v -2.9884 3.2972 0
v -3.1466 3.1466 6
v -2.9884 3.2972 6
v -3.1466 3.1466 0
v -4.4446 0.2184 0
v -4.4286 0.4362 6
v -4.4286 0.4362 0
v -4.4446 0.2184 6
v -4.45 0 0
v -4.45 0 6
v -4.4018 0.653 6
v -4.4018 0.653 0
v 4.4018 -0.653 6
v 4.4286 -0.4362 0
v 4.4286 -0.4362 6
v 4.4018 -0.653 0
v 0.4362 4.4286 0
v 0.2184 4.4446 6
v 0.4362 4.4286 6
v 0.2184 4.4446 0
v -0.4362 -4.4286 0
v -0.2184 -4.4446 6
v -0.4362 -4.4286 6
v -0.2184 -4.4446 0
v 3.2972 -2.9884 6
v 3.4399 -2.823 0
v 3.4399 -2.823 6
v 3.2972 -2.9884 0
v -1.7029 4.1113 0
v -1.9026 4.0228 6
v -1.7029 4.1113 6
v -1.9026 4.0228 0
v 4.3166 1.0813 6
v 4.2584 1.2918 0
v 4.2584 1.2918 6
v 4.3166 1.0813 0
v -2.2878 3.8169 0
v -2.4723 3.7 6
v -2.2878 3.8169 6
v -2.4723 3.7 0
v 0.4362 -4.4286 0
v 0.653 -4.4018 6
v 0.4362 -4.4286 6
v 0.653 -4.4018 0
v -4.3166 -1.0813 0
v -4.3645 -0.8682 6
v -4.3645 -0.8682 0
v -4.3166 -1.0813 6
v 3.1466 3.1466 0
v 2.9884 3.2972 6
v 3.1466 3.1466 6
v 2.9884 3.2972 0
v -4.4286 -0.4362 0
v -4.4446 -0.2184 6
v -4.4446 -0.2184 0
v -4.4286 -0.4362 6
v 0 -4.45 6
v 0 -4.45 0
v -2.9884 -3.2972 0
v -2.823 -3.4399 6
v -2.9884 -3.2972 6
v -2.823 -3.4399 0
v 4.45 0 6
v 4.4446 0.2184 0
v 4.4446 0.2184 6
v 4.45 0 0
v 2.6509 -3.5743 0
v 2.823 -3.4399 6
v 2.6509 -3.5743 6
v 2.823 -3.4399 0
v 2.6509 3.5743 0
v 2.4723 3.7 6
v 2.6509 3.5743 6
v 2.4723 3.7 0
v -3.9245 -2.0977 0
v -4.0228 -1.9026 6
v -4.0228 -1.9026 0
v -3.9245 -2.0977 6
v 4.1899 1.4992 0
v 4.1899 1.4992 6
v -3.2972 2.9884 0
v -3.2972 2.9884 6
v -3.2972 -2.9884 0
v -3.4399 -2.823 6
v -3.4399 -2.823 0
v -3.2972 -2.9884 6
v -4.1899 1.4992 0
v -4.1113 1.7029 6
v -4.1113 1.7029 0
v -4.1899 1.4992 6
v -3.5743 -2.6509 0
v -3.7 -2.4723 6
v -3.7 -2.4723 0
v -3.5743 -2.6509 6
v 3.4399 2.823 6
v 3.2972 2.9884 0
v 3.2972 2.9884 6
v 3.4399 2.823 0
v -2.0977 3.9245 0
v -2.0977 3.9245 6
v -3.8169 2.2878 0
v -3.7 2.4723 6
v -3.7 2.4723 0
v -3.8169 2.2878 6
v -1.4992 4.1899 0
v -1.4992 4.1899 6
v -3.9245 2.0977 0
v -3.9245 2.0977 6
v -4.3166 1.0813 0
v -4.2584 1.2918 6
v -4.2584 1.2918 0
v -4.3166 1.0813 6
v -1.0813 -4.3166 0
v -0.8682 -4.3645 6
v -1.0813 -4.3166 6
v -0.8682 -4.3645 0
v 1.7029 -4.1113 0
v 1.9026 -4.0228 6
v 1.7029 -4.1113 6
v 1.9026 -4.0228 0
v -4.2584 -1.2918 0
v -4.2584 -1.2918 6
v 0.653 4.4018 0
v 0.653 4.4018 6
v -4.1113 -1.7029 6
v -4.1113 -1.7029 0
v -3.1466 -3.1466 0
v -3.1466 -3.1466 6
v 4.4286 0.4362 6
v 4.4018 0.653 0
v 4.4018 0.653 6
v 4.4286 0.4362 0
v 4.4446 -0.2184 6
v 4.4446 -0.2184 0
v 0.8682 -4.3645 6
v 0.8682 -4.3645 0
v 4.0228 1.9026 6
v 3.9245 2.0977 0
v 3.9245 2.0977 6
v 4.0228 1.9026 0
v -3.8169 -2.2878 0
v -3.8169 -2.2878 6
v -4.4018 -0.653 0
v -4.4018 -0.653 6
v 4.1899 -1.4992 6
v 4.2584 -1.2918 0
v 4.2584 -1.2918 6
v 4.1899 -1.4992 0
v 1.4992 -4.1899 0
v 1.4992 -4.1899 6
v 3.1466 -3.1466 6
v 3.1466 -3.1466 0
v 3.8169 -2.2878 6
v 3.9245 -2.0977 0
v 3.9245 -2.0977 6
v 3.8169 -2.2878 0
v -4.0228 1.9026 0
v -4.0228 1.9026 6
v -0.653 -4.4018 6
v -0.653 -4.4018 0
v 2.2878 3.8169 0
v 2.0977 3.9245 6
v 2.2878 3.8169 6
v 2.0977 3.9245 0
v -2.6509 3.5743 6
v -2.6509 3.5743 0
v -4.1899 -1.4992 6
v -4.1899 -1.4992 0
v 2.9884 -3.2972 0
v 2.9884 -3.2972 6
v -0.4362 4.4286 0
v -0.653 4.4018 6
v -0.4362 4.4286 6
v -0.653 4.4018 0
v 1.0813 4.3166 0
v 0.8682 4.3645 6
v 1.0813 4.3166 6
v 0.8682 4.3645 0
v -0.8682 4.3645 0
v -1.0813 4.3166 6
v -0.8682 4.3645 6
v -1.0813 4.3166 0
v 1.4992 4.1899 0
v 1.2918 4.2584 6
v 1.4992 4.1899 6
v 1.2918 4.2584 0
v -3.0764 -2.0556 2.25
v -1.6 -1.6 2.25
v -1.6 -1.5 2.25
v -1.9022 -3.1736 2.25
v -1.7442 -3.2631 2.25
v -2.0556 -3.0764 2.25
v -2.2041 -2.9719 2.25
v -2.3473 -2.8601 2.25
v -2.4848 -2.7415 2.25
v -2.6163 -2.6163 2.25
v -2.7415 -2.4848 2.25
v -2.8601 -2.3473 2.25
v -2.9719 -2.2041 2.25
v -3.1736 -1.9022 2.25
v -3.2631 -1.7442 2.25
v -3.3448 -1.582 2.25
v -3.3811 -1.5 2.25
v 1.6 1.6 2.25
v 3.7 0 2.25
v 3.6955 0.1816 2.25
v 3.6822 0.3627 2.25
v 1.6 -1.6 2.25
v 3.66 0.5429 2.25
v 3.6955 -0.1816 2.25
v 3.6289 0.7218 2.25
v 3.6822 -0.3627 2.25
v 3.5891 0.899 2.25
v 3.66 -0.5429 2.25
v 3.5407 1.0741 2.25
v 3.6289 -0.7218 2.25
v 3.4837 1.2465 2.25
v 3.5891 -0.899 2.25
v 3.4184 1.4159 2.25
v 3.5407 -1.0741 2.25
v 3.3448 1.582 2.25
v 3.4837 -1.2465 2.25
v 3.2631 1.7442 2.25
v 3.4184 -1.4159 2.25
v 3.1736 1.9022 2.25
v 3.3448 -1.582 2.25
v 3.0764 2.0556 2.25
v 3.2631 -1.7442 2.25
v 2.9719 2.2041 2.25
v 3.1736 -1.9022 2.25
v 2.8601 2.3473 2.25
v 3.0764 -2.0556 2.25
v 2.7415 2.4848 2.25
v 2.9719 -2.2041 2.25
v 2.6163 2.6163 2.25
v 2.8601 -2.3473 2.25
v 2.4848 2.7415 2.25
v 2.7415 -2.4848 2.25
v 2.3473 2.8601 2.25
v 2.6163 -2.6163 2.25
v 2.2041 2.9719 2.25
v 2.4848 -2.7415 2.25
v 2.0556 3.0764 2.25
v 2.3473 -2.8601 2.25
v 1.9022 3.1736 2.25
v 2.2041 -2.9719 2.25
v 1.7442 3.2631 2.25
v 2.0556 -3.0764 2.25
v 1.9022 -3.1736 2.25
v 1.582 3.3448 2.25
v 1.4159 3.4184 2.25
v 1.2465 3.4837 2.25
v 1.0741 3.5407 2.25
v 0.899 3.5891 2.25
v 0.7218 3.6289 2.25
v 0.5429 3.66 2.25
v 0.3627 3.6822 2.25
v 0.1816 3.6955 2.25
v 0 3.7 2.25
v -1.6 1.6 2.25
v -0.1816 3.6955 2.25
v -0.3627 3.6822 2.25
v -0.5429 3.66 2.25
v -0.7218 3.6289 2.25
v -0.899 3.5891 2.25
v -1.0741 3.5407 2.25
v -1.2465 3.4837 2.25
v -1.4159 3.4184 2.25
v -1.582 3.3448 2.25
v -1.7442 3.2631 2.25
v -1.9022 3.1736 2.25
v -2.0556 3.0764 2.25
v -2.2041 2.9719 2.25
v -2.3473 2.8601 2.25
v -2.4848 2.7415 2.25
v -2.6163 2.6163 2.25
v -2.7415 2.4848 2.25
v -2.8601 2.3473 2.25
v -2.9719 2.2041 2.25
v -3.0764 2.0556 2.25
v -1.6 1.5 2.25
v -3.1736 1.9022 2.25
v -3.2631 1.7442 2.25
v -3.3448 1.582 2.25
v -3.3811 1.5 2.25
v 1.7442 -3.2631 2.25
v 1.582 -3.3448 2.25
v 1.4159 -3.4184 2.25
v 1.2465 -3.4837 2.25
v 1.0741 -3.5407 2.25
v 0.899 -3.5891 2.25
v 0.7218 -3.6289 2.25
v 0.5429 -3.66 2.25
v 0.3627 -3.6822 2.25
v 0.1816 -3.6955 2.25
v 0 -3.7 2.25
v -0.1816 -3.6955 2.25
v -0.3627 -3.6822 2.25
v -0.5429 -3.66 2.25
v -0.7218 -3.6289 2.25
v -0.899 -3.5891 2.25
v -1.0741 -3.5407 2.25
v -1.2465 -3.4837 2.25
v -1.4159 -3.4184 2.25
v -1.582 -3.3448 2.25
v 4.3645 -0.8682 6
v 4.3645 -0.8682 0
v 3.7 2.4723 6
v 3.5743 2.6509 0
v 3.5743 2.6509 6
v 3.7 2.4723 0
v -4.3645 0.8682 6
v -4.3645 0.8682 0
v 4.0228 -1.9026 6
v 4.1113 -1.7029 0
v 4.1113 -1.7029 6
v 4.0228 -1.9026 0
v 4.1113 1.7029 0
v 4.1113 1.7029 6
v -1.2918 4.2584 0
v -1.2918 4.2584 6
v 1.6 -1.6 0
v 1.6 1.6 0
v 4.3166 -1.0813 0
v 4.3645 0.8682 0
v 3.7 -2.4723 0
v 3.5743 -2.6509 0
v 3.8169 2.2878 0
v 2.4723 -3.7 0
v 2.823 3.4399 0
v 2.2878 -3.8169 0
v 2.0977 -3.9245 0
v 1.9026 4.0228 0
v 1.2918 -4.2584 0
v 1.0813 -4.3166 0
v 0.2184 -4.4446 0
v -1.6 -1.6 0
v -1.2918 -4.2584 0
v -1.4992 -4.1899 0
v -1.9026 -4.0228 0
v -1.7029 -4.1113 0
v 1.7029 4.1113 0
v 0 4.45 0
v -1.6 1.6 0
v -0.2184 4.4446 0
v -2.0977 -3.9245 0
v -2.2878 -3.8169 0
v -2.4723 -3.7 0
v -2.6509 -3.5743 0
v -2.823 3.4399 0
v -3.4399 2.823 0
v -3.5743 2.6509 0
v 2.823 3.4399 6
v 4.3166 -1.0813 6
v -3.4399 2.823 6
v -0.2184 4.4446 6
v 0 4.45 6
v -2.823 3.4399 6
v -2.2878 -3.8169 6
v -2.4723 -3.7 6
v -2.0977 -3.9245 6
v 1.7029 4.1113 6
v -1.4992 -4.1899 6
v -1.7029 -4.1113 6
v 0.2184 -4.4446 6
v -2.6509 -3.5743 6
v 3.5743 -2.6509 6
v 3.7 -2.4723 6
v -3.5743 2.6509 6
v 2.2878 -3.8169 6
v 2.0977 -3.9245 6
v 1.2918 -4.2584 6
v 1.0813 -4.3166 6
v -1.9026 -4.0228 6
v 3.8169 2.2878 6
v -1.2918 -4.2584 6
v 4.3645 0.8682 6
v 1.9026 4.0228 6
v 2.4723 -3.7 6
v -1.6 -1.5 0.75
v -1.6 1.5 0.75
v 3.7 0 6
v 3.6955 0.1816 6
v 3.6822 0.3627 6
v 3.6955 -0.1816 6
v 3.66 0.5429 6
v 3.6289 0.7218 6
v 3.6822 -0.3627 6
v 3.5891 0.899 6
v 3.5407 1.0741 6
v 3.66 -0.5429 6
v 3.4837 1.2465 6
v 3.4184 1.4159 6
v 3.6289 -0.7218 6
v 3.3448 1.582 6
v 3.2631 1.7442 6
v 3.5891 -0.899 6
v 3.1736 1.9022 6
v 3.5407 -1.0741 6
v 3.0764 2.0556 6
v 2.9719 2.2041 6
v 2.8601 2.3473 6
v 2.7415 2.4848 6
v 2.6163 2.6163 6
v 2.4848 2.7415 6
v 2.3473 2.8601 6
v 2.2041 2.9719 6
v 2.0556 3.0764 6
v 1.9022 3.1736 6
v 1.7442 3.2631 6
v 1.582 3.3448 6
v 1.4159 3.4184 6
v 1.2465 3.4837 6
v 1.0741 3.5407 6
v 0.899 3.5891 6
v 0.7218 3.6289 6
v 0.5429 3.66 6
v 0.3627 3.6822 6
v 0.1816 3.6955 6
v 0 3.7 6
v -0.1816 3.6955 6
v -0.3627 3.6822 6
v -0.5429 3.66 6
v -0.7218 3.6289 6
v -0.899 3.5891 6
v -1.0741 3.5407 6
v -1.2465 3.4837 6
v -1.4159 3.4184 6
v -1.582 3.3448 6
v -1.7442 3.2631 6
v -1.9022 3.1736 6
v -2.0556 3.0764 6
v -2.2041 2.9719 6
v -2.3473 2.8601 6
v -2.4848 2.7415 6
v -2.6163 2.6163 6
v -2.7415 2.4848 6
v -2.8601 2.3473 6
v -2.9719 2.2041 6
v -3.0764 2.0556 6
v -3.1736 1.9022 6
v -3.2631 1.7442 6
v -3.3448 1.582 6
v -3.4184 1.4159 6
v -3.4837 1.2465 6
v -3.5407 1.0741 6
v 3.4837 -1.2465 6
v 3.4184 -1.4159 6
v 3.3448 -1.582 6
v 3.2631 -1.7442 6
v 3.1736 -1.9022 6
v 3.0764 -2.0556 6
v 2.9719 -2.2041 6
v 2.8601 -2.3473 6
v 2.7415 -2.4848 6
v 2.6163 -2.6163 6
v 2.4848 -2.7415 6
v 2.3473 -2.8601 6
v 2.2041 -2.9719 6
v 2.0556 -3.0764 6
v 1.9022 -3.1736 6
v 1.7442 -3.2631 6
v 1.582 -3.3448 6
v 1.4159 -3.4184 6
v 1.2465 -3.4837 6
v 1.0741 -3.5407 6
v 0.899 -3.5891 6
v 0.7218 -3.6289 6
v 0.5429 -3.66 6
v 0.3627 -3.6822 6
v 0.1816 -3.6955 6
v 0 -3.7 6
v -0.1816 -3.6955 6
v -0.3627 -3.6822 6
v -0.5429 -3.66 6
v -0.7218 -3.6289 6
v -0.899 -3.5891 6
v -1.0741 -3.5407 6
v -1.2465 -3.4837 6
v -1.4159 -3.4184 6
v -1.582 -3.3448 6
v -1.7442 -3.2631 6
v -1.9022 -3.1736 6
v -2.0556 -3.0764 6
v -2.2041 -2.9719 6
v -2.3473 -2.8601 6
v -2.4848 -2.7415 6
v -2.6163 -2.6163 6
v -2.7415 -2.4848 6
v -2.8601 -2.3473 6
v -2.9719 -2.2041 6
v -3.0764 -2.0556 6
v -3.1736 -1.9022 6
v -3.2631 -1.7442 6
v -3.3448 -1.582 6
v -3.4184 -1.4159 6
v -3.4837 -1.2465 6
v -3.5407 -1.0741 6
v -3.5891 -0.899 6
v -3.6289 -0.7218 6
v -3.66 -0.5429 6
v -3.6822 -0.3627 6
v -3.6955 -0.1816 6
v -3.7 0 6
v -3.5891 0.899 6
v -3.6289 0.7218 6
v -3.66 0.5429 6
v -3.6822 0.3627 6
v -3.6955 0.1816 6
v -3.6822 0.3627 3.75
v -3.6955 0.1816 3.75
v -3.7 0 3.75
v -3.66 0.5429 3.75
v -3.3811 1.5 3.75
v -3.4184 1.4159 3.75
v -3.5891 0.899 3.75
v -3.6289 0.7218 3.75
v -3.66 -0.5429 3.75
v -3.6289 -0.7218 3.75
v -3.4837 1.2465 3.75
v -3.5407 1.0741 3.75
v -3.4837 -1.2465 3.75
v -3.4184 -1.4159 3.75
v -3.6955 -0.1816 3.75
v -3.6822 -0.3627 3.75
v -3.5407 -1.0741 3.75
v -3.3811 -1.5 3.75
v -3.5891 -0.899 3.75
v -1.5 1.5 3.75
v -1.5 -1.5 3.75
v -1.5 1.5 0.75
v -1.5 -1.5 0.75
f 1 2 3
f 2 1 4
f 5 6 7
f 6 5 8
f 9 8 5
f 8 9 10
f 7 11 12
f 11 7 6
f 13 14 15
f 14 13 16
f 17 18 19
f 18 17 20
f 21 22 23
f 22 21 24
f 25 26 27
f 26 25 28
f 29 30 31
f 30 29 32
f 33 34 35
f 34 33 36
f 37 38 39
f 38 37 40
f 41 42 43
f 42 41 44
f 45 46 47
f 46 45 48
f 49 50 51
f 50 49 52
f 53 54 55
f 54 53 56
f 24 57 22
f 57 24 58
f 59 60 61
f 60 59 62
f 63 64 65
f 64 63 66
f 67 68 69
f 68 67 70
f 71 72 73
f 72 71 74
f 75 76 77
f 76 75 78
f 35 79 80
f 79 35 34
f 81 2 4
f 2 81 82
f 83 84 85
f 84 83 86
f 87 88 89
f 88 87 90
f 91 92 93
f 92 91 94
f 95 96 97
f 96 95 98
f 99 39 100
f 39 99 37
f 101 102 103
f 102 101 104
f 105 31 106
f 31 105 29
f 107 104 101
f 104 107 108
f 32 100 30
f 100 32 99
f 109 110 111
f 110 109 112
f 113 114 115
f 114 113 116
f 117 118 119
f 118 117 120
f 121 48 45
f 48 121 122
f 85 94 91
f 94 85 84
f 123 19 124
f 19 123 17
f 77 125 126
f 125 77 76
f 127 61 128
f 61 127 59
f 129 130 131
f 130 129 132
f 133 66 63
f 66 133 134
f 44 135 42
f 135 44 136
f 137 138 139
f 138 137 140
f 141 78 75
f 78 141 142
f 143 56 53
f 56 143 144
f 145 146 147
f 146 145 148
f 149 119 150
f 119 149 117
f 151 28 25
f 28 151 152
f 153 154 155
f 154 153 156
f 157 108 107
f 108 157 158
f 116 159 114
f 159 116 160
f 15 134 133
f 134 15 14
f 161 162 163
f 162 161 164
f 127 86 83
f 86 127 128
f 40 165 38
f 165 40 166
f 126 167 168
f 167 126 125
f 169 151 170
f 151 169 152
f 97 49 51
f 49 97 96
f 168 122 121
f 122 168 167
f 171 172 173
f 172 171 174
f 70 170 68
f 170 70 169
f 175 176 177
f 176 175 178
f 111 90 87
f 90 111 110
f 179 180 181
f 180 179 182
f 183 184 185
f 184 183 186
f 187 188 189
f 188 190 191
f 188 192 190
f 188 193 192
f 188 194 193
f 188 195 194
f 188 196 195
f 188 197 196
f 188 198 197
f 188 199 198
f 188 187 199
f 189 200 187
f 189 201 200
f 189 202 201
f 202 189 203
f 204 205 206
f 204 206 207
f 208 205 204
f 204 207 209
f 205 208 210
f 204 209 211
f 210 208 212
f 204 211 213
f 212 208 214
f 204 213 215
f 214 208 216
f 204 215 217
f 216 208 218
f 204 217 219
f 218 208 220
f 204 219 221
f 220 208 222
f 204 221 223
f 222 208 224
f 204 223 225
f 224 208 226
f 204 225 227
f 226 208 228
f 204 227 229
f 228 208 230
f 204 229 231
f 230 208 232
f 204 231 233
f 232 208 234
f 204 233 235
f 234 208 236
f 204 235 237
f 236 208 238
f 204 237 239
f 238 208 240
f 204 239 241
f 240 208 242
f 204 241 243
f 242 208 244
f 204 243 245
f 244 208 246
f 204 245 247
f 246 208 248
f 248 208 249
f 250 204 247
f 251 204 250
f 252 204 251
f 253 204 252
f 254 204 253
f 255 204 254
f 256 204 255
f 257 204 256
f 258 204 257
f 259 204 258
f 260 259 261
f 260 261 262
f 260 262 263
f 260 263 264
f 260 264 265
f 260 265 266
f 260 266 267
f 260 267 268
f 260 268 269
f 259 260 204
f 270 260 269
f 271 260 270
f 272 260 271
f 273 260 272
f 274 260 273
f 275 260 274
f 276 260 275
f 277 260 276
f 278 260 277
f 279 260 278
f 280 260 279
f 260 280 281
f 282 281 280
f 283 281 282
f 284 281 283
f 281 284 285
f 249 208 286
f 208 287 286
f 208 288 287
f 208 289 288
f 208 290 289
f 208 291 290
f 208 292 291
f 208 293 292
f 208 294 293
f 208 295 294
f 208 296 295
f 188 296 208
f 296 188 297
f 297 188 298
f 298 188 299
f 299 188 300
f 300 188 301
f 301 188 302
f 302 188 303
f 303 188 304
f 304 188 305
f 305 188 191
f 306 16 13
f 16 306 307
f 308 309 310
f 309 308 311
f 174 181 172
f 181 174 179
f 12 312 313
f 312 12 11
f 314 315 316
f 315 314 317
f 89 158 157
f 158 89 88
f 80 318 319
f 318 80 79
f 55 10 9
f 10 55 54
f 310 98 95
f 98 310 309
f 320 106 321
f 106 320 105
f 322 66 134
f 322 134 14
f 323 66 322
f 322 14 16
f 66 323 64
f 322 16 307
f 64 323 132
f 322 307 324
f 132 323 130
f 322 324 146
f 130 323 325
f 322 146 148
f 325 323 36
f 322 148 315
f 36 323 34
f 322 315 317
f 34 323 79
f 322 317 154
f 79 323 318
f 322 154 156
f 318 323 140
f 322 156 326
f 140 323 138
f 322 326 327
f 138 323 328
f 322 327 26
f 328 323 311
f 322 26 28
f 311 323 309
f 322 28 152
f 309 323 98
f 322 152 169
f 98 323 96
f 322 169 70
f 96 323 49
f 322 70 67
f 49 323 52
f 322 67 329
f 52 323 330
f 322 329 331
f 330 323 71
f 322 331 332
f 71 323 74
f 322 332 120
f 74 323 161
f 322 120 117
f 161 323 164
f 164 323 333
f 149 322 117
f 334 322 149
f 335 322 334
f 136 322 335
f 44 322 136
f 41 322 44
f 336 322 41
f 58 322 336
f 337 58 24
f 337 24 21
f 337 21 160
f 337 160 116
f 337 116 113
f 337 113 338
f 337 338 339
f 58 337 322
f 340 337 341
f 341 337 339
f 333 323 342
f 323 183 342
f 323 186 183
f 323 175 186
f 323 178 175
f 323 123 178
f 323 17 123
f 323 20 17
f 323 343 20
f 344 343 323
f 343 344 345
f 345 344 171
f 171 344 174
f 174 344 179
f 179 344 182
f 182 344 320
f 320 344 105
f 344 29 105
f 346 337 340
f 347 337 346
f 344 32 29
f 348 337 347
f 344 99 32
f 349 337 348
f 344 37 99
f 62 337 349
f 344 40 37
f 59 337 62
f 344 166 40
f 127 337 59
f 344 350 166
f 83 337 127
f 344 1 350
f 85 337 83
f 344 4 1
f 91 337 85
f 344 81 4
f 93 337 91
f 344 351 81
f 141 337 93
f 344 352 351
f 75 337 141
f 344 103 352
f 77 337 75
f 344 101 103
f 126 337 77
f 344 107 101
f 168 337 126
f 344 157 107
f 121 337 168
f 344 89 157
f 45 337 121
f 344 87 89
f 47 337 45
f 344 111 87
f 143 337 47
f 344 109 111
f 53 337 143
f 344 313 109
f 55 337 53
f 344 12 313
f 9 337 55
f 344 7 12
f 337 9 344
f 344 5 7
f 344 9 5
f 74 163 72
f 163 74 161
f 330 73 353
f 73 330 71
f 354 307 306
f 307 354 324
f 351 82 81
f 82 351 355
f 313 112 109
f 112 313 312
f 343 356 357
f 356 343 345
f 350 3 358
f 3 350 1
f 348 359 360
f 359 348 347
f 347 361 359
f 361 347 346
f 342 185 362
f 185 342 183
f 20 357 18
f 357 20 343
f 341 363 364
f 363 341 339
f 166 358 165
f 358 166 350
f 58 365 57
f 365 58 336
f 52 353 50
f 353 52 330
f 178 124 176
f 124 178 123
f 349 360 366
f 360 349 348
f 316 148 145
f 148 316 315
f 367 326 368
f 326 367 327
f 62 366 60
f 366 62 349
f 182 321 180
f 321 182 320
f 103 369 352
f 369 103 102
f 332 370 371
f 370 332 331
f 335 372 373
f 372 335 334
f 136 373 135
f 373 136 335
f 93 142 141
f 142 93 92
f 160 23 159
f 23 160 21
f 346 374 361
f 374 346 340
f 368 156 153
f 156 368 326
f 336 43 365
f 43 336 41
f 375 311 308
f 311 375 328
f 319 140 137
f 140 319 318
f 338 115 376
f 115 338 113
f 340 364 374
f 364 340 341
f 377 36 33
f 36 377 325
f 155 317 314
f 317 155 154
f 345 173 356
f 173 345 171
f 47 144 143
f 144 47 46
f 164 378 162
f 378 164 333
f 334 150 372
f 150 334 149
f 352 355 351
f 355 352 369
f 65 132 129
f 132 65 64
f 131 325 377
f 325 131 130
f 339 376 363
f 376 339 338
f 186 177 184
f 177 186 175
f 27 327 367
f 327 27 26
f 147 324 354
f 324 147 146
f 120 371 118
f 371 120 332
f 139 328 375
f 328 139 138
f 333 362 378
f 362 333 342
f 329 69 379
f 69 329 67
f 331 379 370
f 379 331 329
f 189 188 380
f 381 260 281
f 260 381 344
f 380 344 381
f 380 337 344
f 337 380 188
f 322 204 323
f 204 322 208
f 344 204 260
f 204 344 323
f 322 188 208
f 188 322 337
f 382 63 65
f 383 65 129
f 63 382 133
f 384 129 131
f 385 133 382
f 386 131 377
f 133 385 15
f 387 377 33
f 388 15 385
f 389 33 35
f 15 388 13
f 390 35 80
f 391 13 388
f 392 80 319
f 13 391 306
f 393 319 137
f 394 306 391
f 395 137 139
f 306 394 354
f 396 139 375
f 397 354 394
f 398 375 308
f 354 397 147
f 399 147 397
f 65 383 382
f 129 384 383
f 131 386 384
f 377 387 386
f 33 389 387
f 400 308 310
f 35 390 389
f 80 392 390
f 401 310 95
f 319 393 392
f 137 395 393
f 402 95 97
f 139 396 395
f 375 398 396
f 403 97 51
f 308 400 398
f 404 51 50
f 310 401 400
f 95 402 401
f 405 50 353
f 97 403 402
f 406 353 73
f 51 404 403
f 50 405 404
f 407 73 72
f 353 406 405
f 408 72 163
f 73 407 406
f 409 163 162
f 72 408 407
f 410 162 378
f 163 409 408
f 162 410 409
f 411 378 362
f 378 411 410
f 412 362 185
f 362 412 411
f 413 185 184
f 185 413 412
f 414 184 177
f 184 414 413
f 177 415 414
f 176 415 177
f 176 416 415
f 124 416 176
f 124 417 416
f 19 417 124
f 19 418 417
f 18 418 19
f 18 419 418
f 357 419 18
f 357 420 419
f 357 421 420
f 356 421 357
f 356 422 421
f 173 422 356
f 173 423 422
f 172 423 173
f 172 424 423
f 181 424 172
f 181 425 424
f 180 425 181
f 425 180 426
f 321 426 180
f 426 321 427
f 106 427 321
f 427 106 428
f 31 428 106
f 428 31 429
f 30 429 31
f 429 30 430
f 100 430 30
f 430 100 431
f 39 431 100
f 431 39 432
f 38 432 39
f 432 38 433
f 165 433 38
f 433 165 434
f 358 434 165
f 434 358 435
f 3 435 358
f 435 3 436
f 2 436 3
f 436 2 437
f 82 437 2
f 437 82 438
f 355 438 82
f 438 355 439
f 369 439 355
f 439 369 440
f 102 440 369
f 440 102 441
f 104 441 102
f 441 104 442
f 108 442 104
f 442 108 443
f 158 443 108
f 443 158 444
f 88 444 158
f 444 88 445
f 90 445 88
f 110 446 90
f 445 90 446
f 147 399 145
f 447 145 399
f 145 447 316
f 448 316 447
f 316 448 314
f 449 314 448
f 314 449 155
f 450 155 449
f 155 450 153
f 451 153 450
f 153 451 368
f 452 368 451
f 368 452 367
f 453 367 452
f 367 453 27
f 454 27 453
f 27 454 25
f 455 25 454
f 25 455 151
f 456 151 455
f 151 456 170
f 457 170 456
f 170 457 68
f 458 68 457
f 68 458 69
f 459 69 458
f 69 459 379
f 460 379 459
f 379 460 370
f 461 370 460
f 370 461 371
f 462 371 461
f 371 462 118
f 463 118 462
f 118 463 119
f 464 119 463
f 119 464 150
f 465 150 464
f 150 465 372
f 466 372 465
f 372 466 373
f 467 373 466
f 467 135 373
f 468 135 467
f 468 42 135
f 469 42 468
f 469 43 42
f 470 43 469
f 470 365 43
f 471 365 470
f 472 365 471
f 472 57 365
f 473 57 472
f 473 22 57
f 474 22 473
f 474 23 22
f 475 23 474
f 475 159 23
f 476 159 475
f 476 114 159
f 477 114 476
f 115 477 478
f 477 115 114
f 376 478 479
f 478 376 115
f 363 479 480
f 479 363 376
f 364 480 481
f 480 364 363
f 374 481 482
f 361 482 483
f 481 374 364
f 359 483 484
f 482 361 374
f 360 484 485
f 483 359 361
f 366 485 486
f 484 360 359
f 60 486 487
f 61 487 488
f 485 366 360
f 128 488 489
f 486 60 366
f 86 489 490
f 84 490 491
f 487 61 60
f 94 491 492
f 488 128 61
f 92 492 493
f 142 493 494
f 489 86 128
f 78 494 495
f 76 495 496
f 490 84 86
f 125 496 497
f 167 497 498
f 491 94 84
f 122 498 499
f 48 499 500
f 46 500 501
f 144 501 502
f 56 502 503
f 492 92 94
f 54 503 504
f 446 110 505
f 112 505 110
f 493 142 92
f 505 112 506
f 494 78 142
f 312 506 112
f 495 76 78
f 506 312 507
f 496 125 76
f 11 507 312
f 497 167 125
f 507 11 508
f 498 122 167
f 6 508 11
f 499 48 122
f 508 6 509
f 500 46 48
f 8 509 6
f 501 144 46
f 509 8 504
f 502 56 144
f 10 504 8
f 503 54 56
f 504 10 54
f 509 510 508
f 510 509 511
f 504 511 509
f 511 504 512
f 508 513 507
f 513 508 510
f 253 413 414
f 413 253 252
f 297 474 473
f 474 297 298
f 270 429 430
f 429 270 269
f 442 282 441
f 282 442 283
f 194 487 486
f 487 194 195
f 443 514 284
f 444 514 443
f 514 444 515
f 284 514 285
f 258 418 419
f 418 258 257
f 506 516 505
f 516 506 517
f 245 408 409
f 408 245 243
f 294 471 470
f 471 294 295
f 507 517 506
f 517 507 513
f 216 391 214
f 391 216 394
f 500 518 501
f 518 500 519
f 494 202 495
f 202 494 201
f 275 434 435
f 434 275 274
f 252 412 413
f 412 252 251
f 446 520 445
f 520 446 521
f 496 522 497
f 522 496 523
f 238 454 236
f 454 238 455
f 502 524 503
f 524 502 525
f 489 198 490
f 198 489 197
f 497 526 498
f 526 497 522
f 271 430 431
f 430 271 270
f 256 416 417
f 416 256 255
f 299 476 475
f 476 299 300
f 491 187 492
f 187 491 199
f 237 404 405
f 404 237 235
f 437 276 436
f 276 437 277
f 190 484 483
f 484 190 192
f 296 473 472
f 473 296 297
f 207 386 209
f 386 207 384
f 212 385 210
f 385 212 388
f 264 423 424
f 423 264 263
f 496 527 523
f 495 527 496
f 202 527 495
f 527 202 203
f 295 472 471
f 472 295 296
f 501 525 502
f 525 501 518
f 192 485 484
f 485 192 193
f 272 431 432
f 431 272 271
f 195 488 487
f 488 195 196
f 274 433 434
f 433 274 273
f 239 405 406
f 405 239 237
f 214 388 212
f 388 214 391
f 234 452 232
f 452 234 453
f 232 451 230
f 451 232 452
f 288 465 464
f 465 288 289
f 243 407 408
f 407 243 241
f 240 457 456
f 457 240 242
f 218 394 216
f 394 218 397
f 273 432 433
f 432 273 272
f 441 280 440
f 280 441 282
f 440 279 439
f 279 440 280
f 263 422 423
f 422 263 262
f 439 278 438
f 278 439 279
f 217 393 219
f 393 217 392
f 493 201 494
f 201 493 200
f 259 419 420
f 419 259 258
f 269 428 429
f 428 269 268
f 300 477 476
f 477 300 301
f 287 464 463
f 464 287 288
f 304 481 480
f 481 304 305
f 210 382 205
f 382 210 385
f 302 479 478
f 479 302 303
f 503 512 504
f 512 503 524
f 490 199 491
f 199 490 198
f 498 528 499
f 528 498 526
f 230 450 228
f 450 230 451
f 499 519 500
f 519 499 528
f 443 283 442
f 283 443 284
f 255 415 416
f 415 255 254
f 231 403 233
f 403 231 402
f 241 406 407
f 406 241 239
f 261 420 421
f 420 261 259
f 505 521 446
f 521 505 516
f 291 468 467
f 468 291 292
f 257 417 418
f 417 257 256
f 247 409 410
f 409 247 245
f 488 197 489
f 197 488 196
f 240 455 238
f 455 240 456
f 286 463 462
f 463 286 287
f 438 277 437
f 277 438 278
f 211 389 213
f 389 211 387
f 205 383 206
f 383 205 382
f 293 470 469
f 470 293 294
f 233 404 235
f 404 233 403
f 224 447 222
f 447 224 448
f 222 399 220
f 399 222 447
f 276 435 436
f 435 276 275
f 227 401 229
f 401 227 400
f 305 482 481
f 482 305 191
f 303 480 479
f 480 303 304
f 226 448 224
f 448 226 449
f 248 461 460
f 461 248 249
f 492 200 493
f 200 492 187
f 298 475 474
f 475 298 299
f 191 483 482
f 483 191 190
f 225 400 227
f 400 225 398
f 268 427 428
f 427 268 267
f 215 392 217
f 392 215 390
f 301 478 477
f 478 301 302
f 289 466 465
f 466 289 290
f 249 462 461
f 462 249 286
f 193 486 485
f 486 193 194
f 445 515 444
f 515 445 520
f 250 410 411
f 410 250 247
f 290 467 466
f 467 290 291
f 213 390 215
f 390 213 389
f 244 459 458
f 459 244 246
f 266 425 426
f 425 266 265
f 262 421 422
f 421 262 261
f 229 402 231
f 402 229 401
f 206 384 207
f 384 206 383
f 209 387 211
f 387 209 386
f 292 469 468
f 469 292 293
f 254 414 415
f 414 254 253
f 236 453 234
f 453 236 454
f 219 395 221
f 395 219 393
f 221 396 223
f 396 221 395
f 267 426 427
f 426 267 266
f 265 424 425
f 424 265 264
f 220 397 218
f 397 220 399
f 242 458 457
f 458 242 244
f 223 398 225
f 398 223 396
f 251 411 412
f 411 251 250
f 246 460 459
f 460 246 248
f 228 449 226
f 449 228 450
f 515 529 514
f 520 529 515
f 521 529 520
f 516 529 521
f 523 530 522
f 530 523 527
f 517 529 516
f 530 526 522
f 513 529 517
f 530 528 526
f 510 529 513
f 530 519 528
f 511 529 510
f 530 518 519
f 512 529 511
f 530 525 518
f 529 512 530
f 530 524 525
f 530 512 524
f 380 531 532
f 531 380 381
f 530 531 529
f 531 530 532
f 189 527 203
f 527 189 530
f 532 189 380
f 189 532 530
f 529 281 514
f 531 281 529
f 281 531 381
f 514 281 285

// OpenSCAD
//
// Test Rig for Primo EM182 capsules
//
// Copyright 2015, Fernando Lopez-Lezcano, All Rights Reserved
// nando@ccrma.stanford.edu
//
//
//  This program is free software: you can redistribute it and/or modify
//  it under the terms of the GNU General Public License as published by
//  the Free Software Foundation, either version 3 of the License, or
//  (at your option) any later version.
//
//  This program is distributed in the hope that it will be useful,
//  but WITHOUT ANY WARRANTY; without even the implied warranty of
//  MERCHANTABILITY or FITNESS FOR A PARTICULAR PURPOSE.  See the
//  GNU General Public License for more details.
//
//  You should have received a copy of the GNU General Public License
//  along with this program.  If not, see <http://www.gnu.org/licenses/>.
//
//
// 3d Models released under the Creative Commons license as follows:
//   Attribution-NonCommercial-ShareAlike 4.0 International (CC BY-NC-SA 4.0)
// http://creativecommons.org/licenses/by-nc-sa/4.0/

// dimensions of the EM182 electret microphone
capsule_radius = 5;
capsule_radius_i = 2.2;
capsule_height = 4.5;

// wall thickness of capsule holder
wall = 1;

// contact pads
pad_offset = 3.56;

// slot for contact
// contact_width = 0.85;
contact_width = 1.00;

// length of contact
contact_length = 2.9;

// depth of contact channel (includes contact)
// contact_depth = 0.79;
contact_depth = 0.5;

// island around contact
contact_border = 0.5;

// contact offset from center line
contact_offset = 0.3;

// cutout offset from edge of capsule
contact_cutout = 2.0;
contact_cutout_gnd = 2.5;

// support depth
disk_depth = 0.9;
disk_edge = 0.49;

// thinkness of sleeve
sleeve_edge = 0.66;

// adjustment for the inner radius of the capsule holder
//   measured inside diameter of a trial print was around 7.5 to 8.2 
//   instead of 10, capsule diameter was 9.99)
//   changed from 0.15 to 0.1 for tighter fit
fudge = 0.10;

// number of facets for rendering cylinders
facets = 128;

// one slot for a contact
module contact (trans, angle, cutout, slot = false) {
    rotate([0, 0, angle]) {
        translate(trans) {
            translate([- (contact_width + 2 * contact_border) / 2, 0, 0]) {
                if (slot == false) {
                    difference() {
                        // base for the contact
                        cube([contact_width + 2 * contact_border, capsule_radius + wall / 2, disk_depth]);
                        translate([contact_width / 2, 0, contact_depth]) {
                            // channel for clip
                            cube([contact_width, capsule_radius + wall / 2, disk_depth]);
                        }
                        // cutout for clip from edge of disk
                        translate([contact_width / 2, capsule_radius - cutout, 0]) {
                            cube([contact_width, contact_width, disk_depth]);
                            //cylinder(r = contact_width / 2 * 1.25, h = disk_depth, $fn = facets);
                        }
                    }
                } else {
                    // just the cutouts
                    translate([contact_width / 2, 0, contact_depth]) {
                        // channel for clip
                        cube([contact_width, capsule_radius + wall, disk_depth]);
                    }
                    translate([contact_width / 2, capsule_radius - cutout, 0]) {
                        cube([contact_width, contact_width, disk_depth]);
                        //cylinder(r = contact_width / 2 * 1.25, h = disk_depth, $fn = facets);
                    }
                }
            }
        }
    }
}

// main capsule holder
module capsule_holder () {
    difference() {
        cylinder(r = capsule_radius + wall, h = capsule_height, $fn = facets);
        cylinder(r = capsule_radius + fudge, h = capsule_height, $fn = facets);
    }
}

// back plate with contact springs
module backplate () {
    difference() {
        union() {
            difference() {
                union() {
                    cylinder(r = capsule_radius + wall, h = disk_edge, $fn = facets);
                    cylinder(r = capsule_radius, h = disk_depth, $fn = facets);
                }
                difference() {
                    cylinder(r = capsule_radius, h = disk_depth, $fn = facets);
                    cylinder(r = capsule_radius_i, h = disk_depth, $fn = facets);
                }
            }
            // contacts
            contact([contact_border + contact_offset, 0, 0], 0, contact_cutout);
            contact([-contact_border - contact_offset, 0, 0], 0, contact_cutout);
            // GND contact
            contact([- contact_border - contact_offset, 0, 0], 90, contact_cutout_gnd);
            // one more radial connection
            rotate([0, 0, -120]) {
                translate([-contact_width / 2, 0, 0]) {
                    cube([contact_width, capsule_radius, disk_depth]);
                }
            }
        }
        // contact cutouts
        contact([contact_border + contact_offset, 0, 0], 0, contact_cutout, true);
        contact([-contact_border - contact_offset, 0, 0], 0, contact_cutout, true);
        // contact cutout for GND
        contact([- contact_border - contact_offset, 0, 0], 90, contact_cutout_gnd, true);
        // finally trim the seat for the holder
        translate([0, 0, disk_edge]) {
            difference() {
                cylinder(r = capsule_radius + wall, h = disk_depth, $fn = facets);
                cylinder(r = capsule_radius, h = disk_depth, $fn = facets);
            }
        }
    }
}

stalk_height = 12.0;

sleeve_height = capsule_height * 2 / 3;

// sleeve that holds everything together
module sleeve () {
    difference() {
        cylinder(r = capsule_radius + 2 * wall, h = sleeve_height, $fn = facets);
        cylinder(r = capsule_radius + wall, h = sleeve_height, $fn = facets);
    }
    difference() {
        cylinder(r = capsule_radius + wall, h = sleeve_edge, $fn = facets);
        cylinder(r = capsule_radius, h = sleeve_edge, $fn = facets);
    }
    // back plate for contacts 1 / 2
    translate([-(contact_width + 1.5 * contact_border) + 0.1, capsule_radius / 2 - 0.1, 0]) {
        cube([(contact_width + 1.5 * contact_border) * 2 - 0.2, capsule_radius / 2 + 0.1, sleeve_edge]);
    }
    // back plate for GND contact
    rotate([0, 0, 90]) {
        translate([-(contact_width + 1.5 * contact_border), capsule_radius * 1 / 3, 0]) {
            cube([(contact_width + 1.5 * contact_border), capsule_radius * 2 / 3, sleeve_edge]);
        }
    }
    // mount stalk
    translate([-sleeve_height / 2, -(capsule_radius + wall), sleeve_height]) {
        rotate([90, 90, 0]) {
            cube([sleeve_height, sleeve_height, stalk_height + sleeve_height]); 
        }
    }
    // lever to rotate capsule between 0 and 90 degrees
    translate([sleeve_height / 2, - (capsule_radius + wall + stalk_height), 0]) {
        rotate([0, 0, 0]) {
            cube([capsule_height * 2, sleeve_height, sleeve_height]);
        }
    }
}

// mount that clips on a standard microphone stand

// dimensions of microphone holder
mount_radius = 2.75;
mount_wall = 0.75;

// height of mount
mount_height = 40;

// microphone stand mount
//
// diameter of existing shielded wires (x 4)
mic_wire_diam = 1.5;
mic_wire_hole_radius = 2.5;
mic_wire_hole_offset = 5;

// measured diameter = 13.5, inside diameter of sleeve = 13.79 (
mic_mount_radius = 13.50 / 2;
// add this to inside diameter
mic_mount_fit = 0.1;
mic_mount_slot_height = 11.5;
mic_mount_slot_width = 4.25;
mic_mount_slot_radius = 6.25  / 2;
mic_mount_wall = 1.5;
mic_mount_height = 35.0 + mic_wire_hole_offset + mic_wire_hole_radius + 2 * mic_mount_wall;

module mount (wall, stand_wall, separation) {
    translate([0, 0, -separation]) {
        difference() {
            union() {
                // stalk
                translate([0, 0, mic_mount_height + mount_height * 2/3]) {
                    difference() {
                        cylinder(r = mount_radius + wall, h = mount_height / 3, $fn = facets);
                        // make the hole for the mount
                        cylinder(r = mount_radius, h = mount_height / 3, $fn = facets);
                    }
                }
                // transition to stand mount
                *translate([0, 0, mic_mount_height]) {
                    difference() {
                        cylinder(r2 = mount_radius + wall, r1 = mic_mount_radius + mic_mount_fit + stand_wall, 
                                h = mount_height * 2 / 3, $fn = facets);
                        // make the hole for the mount
                        cylinder(r2 = mount_radius, r1 = mic_mount_radius + mic_mount_fit, 
                                h = mount_height * 2 / 3, $fn = facets);
                    }
                }
                // stand mount
                *translate([0, 0, 0]) {
                    difference() {
                        union() {
                            // main mount cylinder
                            translate([0, 0, 0]) {
                                difference() {
                                    cylinder(r = mic_mount_radius + mic_mount_fit + stand_wall, h = mic_mount_height, $fn = facets);
                                    // make the hole for the mount (* 1.5 to cut the ridge as well)
                                    cylinder(r = mic_mount_radius + mic_mount_fit, h = mic_mount_height, $fn = facets);
                                }
                            }
                        }
                        // slot for fitting into microphone stand
                        translate([mic_mount_radius - stand_wall / 2, - mic_mount_slot_width / 2, 0]) {
                            cube([2 * stand_wall, mic_mount_slot_width, mic_mount_slot_height]);
                        }
                        // eyelet for microphone stand
                        translate([mic_mount_radius - stand_wall / 2, 0,  mic_mount_slot_height]) {
                            rotate([0, 90, 0]) {
                                cylinder(r = mic_mount_slot_radius, h = 2 * stand_wall, $fn = facets);
                            }
                        }
                    }
                }
            }
            // cut slot for detente at the top of the mount
            translate([- sleeve_height / 2, - sleeve_height / 2, mic_mount_height + mount_height - sleeve_height / 2]) {
                cube([2 * mount_radius + wall, 2 * mount_radius + wall, sleeve_height / 2]);
            }
        }
    }
}


tab_width = 3.0;
tab_length = 3.0;

module mount_cap (wall, separation) {
    translate([0, 0, -(separation)]) {
        difference() {
            union() {
                // cap
                cylinder(r = mount_radius + wall, h = 3 * wall, $fn = facets);
                translate([0, 0, - 2 * wall]) {
                    cylinder(r = mount_radius + mic_mount_fit, h = 3 * wall, $fn = facets);
                }
            }
            // hole in the center
            *translate([0, 0, - 2 * wall]) {
                cylinder(r = sleeve_height / 2, h = 6 * wall, $fn = facets);
            }
            // slot for detente
            translate([- sleeve_height / 2, - sleeve_height / 2, 2 * wall]) {
                cube([2 * mount_radius + wall, 2 * mount_radius + wall, wall]);
            }
        }
    }
}

// stalk: measured in print: 2.86 - 2.87
// hole: measured: 2.63 - 2.68
//   so need a fit of 2.87 - 2.68 / 2 = 0.095 ~ 0.1 (hole should be bigger by this amount)
square_fit = 0.1;

// mount tube: measured 7.1 (average)
// skirt inner diameter: 6.88
//   fit: 7.1 - 6.88 / 2 = 0.11 ~ 0.1 too tight, 0.25 too lose
mount_fit = 0.2;

module mount_adapter(wall, separation) {
    difference() {
        union() {
            translate([0, 0, -separation]) {
                difference() {
                    cylinder(r = mount_radius + 2 * wall + mount_fit, h = 3 * wall, $fn = facets);
                    // hole for square peg
                    hole_side = sleeve_height + square_fit * 2;
                    translate([-hole_side / 2, -hole_side / 2]) {
                        cube([hole_side, hole_side, hole_side]);
                    }
                }
            }
            // skirt that grabs the mount and allows the holder to rotate
            translate([0, 0, - 5 * wall]) {
                difference() {
                    cylinder(r = mount_radius + 2 * wall + mount_fit, h = 5 * wall, $fn = facets);
                    cylinder(r = mount_radius + wall + mount_fit, h = 5 * wall, $fn = facets);
                }
            }
            // tab to stop rotation at 0 and 90 degrees
            translate([sleeve_height * 3 / 2, - sleeve_height / 2, - sleeve_height / 2]) {
                rotate([0, -90, 0]) {
                    cube([sleeve_height, sleeve_height, sleeve_height]);
                }
            }
        }
        // clip the outside...
        translate([0, 0, -2 * wall]) {
            difference() {
                cylinder(r = mount_radius + 4 * wall + mount_fit, h = 4 * wall, $fn = facets);
                cylinder(r = mount_radius + 2 * wall + mount_fit, h = 4 * wall, $fn = facets);
            }
        }
    }
}

////

printset = 1;

if (printset == 1) {

    // adapter
    rotate([0, 180, 0]) {
        translate([0, 0, - sleeve_height + sleeve_height / 4]) {
            mount_adapter(mount_wall, 0);
        }
    }
    // sleeve
    *translate([- sleeve_height / 2, 15, 0]) {
        rotate([0, 0, 90]) {
            sleeve();
        }
    }
    // backplate
    *translate([15, 0, 0]) {
        backplate();
    }
    // mount (test)
    *translate([12, 0, -(mic_mount_height + mount_height - mount_height / 3)]) {
        mount(mount_wall, mic_mount_wall);
    }
    
} else {

translate([0, 0, -(mic_mount_height + mount_height + capsule_radius + 2 * wall + 2.2 * stalk_height)]) {
    mount(mount_wall, mic_mount_wall);
}

rotate([0, 0, 90]) {
    translate([0, 0, -2.2 * stalk_height]) {
        mount_adapter(mount_wall, 0);
    }
}

*translate([0, 0, - 2.7 * stalk_height]) {
    mount_cap(mount_wall, 0);
}

translate([- sleeve_height / 2, 0, 0]) {
    rotate([90, 0, 90]) {
        sleeve();
    }
}

*backplate();

translate([capsule_radius * 3.0, capsule_radius * 3, 0]) {
    rotate([90, 0, 0]) {
        capsule_holder();
    }
}

}
